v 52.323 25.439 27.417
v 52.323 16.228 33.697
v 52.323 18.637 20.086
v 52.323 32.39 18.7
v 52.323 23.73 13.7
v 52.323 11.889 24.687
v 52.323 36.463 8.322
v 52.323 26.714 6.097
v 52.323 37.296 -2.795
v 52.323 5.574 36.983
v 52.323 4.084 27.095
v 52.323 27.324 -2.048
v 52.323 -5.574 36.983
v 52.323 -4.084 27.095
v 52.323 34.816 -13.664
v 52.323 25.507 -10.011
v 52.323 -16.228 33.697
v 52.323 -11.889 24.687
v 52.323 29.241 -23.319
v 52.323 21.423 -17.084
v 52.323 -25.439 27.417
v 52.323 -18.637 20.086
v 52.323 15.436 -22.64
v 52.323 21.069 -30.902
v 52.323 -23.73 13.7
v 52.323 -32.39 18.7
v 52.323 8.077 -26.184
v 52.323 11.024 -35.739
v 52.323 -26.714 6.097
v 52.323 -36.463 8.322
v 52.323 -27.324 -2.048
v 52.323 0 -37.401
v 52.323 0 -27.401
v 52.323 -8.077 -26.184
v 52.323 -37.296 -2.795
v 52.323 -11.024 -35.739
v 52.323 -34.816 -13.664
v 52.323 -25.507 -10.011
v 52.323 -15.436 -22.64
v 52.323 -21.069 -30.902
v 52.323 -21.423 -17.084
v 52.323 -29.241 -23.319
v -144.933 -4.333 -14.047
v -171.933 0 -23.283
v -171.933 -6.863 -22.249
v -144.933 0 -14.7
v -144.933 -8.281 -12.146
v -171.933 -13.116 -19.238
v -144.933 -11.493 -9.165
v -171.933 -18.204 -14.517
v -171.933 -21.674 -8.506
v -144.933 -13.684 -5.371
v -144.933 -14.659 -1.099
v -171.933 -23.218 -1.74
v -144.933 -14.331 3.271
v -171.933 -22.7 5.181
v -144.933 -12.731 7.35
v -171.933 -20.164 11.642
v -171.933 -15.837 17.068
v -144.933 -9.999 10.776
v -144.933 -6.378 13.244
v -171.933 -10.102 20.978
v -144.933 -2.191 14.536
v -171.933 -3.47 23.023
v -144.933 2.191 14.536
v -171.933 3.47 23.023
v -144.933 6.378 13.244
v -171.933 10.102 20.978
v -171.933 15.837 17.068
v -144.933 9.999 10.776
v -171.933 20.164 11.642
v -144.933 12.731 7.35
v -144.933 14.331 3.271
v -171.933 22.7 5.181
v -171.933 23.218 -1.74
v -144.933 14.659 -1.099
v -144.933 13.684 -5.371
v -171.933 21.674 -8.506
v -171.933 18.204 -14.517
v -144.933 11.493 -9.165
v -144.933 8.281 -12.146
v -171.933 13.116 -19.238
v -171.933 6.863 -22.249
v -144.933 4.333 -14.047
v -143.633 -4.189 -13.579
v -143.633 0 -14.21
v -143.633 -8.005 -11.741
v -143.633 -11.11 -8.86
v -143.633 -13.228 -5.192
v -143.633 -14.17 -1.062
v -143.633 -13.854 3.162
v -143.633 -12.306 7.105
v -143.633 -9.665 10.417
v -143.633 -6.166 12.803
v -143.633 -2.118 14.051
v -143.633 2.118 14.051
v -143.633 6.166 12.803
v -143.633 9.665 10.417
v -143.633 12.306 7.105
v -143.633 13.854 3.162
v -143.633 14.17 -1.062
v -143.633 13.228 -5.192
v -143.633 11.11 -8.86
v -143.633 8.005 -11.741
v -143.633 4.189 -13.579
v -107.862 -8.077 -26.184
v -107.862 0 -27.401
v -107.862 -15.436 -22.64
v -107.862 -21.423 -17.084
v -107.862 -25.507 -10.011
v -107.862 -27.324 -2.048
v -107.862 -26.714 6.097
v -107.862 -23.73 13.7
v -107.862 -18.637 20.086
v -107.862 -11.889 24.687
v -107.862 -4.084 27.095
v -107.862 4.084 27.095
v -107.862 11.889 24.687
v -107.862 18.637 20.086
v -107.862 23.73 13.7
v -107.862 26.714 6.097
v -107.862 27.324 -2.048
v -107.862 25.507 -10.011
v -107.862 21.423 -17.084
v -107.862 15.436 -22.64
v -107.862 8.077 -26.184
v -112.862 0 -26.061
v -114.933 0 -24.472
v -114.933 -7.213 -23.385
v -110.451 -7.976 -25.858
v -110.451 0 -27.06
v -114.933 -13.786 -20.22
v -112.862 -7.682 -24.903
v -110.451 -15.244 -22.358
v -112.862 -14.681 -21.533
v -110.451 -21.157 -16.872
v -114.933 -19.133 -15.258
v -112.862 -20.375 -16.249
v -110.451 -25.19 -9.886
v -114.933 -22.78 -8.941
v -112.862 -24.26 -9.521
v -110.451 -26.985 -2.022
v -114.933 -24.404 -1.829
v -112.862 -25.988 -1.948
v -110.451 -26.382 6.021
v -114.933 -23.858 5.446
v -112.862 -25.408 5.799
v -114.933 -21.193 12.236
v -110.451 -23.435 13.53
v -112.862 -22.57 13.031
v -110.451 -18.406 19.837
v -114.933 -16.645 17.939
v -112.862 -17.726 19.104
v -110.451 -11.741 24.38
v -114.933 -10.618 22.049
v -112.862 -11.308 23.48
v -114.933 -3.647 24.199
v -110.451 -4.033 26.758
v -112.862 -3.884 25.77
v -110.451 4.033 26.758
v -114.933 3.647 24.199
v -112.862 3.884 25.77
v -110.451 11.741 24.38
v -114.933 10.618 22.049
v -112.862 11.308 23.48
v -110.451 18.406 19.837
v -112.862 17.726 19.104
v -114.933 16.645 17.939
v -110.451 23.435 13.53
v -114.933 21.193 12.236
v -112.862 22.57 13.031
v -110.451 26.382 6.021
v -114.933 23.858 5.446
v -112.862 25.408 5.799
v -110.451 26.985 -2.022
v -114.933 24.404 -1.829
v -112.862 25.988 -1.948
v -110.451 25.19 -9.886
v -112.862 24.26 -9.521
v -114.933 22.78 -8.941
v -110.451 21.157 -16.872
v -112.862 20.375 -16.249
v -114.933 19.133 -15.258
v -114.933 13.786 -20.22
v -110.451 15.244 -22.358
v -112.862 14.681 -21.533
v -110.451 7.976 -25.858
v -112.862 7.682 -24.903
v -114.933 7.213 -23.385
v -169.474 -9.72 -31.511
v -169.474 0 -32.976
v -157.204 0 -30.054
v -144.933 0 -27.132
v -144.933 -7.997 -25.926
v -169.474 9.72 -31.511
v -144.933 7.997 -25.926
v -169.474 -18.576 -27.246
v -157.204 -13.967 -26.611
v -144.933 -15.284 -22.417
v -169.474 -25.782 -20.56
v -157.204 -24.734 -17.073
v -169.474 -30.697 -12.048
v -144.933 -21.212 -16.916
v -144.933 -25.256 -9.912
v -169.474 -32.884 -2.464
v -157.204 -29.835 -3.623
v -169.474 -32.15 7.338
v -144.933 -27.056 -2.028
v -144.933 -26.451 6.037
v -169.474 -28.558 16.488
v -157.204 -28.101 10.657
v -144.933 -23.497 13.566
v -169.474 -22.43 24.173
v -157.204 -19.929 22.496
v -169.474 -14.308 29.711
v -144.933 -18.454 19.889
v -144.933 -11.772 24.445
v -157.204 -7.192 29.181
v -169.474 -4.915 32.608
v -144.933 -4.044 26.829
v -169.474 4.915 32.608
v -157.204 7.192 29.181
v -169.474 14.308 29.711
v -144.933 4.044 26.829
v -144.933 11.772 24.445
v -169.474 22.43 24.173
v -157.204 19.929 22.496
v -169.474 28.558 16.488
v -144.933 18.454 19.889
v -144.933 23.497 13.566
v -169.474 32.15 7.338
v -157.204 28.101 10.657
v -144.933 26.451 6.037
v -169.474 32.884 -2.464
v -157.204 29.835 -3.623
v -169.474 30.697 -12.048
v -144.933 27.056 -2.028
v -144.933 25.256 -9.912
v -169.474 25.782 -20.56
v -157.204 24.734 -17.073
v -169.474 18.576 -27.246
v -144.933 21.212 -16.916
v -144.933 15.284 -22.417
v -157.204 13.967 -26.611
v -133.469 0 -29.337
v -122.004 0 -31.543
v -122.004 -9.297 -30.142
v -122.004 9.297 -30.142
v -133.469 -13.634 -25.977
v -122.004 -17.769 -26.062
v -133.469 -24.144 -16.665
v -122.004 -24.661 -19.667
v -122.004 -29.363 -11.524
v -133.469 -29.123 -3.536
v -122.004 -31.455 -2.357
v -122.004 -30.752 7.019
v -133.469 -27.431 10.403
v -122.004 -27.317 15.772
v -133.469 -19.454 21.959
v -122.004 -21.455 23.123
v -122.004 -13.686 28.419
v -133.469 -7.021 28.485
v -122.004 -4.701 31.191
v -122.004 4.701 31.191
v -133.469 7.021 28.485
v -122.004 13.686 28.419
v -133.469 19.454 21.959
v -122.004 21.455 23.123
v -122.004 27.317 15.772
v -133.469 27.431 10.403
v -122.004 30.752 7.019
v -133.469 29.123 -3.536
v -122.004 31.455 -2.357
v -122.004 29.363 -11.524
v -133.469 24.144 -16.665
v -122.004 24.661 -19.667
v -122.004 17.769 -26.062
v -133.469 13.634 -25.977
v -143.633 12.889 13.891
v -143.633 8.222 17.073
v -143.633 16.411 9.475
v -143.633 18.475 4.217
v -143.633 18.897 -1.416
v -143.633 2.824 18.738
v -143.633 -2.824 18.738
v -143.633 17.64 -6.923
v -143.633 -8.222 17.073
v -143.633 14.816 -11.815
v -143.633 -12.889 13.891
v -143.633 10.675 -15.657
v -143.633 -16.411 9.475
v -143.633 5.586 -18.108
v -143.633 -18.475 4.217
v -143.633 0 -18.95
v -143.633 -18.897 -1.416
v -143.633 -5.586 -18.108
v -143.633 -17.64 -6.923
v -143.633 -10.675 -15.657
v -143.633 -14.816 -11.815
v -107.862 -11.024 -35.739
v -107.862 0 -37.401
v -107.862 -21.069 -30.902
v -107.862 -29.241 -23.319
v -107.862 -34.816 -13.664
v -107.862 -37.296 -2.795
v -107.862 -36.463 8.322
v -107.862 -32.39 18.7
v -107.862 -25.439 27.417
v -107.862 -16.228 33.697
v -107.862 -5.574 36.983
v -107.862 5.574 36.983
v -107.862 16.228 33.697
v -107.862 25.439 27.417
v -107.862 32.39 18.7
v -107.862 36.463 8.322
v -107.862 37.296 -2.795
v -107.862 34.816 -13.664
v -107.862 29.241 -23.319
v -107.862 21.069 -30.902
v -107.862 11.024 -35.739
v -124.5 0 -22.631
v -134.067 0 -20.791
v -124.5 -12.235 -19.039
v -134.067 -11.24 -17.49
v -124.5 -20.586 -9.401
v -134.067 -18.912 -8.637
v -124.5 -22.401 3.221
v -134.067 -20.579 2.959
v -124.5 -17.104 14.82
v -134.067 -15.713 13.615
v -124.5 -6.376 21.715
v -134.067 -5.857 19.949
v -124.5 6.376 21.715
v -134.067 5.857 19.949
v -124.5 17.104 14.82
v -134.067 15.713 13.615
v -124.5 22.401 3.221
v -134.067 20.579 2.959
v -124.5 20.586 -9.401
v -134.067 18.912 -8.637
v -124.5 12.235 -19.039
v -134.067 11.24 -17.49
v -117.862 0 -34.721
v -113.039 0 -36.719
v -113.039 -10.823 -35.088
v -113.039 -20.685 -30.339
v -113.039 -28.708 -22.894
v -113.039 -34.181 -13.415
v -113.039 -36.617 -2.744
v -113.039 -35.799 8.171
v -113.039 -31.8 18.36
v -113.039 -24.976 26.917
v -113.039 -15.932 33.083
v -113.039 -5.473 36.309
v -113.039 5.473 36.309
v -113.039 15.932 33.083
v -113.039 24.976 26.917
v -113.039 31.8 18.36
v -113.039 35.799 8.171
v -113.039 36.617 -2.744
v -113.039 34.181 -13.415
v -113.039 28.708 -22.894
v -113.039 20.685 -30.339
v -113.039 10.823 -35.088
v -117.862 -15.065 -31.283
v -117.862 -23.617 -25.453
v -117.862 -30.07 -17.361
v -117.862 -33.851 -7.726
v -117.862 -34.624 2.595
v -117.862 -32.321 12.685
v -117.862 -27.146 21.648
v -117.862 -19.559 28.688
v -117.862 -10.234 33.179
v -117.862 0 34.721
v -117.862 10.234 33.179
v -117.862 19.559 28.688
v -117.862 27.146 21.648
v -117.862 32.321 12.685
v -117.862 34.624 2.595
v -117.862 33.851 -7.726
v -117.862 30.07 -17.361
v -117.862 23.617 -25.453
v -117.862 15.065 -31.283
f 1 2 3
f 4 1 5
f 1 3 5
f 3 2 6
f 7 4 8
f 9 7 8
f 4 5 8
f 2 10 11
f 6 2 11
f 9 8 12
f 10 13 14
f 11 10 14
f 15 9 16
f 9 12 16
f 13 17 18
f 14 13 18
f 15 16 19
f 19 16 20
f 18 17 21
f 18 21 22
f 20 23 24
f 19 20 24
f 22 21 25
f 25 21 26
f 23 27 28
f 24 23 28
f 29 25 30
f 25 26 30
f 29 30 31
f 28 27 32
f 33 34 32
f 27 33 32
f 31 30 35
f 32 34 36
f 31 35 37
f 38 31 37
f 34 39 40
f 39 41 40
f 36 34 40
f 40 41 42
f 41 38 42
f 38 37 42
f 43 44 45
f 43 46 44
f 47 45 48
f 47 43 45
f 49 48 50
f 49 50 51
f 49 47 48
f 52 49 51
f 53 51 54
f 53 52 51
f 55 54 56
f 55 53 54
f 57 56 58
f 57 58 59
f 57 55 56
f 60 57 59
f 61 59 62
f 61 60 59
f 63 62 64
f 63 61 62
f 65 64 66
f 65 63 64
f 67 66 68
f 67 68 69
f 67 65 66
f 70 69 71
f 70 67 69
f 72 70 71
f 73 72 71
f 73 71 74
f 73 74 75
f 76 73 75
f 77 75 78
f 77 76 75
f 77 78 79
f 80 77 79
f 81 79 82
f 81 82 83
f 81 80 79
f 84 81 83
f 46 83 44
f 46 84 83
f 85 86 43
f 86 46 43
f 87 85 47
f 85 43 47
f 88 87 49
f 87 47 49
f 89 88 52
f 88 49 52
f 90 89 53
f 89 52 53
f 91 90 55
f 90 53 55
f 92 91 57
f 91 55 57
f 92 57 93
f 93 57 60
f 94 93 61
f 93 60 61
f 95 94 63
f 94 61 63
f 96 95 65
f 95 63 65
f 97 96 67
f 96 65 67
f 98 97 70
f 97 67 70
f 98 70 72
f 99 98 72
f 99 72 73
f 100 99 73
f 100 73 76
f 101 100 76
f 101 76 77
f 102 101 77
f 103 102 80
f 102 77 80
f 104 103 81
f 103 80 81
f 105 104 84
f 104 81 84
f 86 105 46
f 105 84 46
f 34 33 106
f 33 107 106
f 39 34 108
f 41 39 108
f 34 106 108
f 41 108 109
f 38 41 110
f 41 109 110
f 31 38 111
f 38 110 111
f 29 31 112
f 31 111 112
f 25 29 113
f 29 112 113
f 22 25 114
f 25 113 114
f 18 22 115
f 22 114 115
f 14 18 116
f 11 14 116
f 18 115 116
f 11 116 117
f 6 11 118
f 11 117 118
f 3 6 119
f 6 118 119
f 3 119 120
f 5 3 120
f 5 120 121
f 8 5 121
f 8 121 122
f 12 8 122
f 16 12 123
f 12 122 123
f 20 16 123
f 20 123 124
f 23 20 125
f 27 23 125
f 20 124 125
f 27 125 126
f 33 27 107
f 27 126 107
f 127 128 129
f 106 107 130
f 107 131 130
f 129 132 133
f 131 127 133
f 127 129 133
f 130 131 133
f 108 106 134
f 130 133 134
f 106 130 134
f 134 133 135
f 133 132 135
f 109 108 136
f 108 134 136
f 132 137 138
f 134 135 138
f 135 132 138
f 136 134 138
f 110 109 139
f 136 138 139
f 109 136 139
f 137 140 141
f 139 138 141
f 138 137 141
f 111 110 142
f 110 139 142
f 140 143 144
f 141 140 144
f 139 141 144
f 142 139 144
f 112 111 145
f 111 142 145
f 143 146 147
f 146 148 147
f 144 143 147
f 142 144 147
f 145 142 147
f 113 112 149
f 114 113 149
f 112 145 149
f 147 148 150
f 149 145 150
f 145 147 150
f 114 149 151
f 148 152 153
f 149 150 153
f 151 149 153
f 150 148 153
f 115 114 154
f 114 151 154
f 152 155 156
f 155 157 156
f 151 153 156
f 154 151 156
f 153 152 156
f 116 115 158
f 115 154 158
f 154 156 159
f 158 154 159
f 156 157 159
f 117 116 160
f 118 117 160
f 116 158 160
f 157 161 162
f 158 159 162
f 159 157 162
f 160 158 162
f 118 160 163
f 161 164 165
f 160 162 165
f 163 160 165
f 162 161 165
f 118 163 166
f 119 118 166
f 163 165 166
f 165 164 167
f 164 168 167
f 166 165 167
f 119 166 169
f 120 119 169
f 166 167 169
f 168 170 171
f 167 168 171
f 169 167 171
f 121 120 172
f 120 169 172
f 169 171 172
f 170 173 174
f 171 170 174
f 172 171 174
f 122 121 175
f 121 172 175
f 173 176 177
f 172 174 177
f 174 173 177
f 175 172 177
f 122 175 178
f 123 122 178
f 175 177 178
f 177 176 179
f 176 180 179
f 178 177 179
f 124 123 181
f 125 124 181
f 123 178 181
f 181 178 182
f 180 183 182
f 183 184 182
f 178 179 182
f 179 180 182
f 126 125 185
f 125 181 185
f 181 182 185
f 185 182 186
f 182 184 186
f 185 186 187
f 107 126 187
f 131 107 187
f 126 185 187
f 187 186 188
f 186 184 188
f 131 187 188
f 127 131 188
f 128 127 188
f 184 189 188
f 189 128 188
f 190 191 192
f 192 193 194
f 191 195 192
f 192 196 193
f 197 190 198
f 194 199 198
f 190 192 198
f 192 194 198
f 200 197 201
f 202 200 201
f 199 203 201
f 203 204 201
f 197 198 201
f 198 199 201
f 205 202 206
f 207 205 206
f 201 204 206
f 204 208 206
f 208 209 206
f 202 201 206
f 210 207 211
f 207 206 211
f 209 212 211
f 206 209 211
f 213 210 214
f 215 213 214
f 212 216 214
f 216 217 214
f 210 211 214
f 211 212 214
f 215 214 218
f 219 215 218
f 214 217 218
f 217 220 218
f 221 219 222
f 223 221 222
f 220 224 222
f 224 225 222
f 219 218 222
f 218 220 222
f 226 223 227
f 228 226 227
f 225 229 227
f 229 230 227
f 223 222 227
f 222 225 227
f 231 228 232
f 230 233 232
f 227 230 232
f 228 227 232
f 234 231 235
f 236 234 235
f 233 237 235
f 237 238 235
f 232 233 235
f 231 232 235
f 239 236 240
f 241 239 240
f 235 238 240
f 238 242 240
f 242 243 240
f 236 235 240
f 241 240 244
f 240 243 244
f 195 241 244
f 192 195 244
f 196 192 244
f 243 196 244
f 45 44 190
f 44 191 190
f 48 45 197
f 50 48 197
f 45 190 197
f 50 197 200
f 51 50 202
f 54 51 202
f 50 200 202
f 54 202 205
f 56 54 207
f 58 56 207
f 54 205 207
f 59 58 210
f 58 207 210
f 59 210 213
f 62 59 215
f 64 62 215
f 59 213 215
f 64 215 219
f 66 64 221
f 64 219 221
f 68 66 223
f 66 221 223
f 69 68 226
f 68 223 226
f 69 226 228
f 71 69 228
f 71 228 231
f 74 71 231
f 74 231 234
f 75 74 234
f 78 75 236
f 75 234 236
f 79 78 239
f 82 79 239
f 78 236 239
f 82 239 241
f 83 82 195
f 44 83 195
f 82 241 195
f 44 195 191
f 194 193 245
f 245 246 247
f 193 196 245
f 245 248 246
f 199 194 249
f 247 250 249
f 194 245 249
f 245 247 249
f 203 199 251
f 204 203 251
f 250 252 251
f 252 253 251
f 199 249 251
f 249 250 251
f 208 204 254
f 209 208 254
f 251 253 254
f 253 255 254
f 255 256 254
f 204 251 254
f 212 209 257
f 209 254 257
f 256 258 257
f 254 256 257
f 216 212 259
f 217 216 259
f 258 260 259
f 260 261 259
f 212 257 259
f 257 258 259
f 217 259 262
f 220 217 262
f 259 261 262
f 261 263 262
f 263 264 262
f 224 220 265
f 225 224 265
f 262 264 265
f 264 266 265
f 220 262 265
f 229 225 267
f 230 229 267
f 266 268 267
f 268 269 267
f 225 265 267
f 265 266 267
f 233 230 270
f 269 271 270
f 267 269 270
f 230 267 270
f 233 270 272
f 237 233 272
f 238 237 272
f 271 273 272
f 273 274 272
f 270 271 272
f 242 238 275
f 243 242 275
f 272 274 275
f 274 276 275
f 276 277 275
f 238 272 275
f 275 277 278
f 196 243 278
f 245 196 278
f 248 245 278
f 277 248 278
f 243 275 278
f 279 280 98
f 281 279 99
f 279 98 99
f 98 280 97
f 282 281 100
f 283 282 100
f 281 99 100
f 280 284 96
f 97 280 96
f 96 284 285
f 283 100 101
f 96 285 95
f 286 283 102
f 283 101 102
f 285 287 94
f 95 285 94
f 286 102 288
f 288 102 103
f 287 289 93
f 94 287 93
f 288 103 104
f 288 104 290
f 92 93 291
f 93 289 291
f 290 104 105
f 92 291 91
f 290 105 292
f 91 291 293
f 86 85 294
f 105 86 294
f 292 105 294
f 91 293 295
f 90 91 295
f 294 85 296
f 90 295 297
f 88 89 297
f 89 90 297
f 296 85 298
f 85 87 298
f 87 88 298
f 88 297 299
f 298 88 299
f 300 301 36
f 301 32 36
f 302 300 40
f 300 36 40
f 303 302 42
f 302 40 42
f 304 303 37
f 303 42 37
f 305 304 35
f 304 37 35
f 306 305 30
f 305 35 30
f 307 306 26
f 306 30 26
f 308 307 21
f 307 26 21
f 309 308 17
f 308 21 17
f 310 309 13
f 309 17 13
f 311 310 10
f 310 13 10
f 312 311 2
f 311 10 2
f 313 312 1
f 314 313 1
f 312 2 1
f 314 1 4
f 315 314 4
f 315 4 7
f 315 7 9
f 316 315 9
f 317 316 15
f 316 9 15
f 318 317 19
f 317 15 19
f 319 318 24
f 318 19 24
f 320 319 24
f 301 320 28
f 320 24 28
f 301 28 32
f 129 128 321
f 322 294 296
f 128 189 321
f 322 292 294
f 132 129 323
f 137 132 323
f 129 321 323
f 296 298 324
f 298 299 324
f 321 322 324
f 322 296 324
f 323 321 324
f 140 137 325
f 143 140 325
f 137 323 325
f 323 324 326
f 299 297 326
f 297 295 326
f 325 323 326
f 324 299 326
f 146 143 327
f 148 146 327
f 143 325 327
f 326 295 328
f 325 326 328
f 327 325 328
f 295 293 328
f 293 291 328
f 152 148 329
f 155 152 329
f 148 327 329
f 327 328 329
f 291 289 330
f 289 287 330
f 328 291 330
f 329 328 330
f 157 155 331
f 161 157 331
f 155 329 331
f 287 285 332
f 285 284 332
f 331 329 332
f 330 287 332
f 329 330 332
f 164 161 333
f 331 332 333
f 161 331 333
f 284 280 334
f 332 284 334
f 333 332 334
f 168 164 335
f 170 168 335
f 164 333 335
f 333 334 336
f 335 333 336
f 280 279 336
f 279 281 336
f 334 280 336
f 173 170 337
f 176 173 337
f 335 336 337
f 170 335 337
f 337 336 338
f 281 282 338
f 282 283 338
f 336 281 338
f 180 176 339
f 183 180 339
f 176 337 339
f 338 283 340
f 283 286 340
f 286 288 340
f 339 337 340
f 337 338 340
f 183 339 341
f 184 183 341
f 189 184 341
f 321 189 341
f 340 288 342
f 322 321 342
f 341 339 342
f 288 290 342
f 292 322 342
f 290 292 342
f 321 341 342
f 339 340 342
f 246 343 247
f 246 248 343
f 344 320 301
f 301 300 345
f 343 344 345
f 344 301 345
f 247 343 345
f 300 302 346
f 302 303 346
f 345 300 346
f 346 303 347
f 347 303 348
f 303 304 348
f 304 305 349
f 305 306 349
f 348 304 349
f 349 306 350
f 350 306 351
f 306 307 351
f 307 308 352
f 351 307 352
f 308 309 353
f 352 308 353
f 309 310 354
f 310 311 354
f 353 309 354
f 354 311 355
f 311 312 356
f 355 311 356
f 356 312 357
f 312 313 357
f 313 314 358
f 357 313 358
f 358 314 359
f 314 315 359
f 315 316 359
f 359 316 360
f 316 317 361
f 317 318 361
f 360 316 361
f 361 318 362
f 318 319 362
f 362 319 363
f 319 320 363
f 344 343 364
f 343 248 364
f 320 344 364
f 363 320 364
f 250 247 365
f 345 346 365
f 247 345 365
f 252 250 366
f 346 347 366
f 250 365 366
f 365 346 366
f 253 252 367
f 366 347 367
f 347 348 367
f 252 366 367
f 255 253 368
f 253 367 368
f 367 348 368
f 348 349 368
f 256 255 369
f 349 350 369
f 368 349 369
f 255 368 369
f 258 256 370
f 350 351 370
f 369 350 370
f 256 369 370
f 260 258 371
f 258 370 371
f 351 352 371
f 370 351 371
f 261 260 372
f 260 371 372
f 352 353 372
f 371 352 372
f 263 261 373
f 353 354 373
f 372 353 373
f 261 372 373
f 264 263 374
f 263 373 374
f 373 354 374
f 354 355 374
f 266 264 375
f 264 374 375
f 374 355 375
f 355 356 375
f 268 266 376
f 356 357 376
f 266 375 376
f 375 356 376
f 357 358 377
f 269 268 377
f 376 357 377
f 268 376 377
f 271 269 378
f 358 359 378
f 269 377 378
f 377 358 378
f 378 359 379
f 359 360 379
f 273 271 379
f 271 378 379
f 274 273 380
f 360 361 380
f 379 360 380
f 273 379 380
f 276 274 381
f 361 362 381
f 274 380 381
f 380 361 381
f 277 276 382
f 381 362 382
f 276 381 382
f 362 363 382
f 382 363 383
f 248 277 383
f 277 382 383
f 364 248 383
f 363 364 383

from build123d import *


with BuildPart() as part:
    # Sketch1 → Revolve1 (revolve)
    with BuildSketch(Plane.XY, mode=Mode.PRIVATE) as revolve1_sk:
        with BuildLine():
            Line((52.322643444, 27.400944548), (-107.862323025, 27.400944548))
            ThreePointArc((-107.862323025, 27.400944548), (-111.689157349, 26.639739873), (-114.933390837, 24.47201236))
            Line((-114.933390837, 24.47201236), (-143.633390837, 18.950120538))
            Line((-143.633390837, 18.950120538), (-143.633390837, 14.210120538))
            Line((-143.633390837, 14.210120538), (-144.933390837, 14.7))
            add(Edge.make_bspline(
                [(-171.933390837, 23.283456642), (-158.435473315, 19.858823042), (-144.933390837, 14.7)],
                knots=[0, 0, 0, 1, 1, 1], degree=2))
            Line((-171.933390837, 23.283456642), (-169.474152094, 32.976348099))
            Line((-169.474152094, 32.976348099), (-144.933390837, 27.131544172))
            Line((-144.933390837, 27.131544172), (-122.004458649, 31.543080172))
            ThreePointArc((-122.004458649, 31.543080172), (-115.515991673, 35.878535198), (-107.862323025, 37.400944548))
            Line((-107.862323025, 37.400944548), (52.322643444, 37.400944548))
            Line((52.322643444, 37.400944548), (52.322643444, 27.400944548))
        make_face()
    revolve(revolve1_sk.sketch.rotate(Axis((0, 0, 0), (-1, 0, 0)), 90), axis=Axis((0, 0, 0), (-1, 0, 0)))


solid = part.part
